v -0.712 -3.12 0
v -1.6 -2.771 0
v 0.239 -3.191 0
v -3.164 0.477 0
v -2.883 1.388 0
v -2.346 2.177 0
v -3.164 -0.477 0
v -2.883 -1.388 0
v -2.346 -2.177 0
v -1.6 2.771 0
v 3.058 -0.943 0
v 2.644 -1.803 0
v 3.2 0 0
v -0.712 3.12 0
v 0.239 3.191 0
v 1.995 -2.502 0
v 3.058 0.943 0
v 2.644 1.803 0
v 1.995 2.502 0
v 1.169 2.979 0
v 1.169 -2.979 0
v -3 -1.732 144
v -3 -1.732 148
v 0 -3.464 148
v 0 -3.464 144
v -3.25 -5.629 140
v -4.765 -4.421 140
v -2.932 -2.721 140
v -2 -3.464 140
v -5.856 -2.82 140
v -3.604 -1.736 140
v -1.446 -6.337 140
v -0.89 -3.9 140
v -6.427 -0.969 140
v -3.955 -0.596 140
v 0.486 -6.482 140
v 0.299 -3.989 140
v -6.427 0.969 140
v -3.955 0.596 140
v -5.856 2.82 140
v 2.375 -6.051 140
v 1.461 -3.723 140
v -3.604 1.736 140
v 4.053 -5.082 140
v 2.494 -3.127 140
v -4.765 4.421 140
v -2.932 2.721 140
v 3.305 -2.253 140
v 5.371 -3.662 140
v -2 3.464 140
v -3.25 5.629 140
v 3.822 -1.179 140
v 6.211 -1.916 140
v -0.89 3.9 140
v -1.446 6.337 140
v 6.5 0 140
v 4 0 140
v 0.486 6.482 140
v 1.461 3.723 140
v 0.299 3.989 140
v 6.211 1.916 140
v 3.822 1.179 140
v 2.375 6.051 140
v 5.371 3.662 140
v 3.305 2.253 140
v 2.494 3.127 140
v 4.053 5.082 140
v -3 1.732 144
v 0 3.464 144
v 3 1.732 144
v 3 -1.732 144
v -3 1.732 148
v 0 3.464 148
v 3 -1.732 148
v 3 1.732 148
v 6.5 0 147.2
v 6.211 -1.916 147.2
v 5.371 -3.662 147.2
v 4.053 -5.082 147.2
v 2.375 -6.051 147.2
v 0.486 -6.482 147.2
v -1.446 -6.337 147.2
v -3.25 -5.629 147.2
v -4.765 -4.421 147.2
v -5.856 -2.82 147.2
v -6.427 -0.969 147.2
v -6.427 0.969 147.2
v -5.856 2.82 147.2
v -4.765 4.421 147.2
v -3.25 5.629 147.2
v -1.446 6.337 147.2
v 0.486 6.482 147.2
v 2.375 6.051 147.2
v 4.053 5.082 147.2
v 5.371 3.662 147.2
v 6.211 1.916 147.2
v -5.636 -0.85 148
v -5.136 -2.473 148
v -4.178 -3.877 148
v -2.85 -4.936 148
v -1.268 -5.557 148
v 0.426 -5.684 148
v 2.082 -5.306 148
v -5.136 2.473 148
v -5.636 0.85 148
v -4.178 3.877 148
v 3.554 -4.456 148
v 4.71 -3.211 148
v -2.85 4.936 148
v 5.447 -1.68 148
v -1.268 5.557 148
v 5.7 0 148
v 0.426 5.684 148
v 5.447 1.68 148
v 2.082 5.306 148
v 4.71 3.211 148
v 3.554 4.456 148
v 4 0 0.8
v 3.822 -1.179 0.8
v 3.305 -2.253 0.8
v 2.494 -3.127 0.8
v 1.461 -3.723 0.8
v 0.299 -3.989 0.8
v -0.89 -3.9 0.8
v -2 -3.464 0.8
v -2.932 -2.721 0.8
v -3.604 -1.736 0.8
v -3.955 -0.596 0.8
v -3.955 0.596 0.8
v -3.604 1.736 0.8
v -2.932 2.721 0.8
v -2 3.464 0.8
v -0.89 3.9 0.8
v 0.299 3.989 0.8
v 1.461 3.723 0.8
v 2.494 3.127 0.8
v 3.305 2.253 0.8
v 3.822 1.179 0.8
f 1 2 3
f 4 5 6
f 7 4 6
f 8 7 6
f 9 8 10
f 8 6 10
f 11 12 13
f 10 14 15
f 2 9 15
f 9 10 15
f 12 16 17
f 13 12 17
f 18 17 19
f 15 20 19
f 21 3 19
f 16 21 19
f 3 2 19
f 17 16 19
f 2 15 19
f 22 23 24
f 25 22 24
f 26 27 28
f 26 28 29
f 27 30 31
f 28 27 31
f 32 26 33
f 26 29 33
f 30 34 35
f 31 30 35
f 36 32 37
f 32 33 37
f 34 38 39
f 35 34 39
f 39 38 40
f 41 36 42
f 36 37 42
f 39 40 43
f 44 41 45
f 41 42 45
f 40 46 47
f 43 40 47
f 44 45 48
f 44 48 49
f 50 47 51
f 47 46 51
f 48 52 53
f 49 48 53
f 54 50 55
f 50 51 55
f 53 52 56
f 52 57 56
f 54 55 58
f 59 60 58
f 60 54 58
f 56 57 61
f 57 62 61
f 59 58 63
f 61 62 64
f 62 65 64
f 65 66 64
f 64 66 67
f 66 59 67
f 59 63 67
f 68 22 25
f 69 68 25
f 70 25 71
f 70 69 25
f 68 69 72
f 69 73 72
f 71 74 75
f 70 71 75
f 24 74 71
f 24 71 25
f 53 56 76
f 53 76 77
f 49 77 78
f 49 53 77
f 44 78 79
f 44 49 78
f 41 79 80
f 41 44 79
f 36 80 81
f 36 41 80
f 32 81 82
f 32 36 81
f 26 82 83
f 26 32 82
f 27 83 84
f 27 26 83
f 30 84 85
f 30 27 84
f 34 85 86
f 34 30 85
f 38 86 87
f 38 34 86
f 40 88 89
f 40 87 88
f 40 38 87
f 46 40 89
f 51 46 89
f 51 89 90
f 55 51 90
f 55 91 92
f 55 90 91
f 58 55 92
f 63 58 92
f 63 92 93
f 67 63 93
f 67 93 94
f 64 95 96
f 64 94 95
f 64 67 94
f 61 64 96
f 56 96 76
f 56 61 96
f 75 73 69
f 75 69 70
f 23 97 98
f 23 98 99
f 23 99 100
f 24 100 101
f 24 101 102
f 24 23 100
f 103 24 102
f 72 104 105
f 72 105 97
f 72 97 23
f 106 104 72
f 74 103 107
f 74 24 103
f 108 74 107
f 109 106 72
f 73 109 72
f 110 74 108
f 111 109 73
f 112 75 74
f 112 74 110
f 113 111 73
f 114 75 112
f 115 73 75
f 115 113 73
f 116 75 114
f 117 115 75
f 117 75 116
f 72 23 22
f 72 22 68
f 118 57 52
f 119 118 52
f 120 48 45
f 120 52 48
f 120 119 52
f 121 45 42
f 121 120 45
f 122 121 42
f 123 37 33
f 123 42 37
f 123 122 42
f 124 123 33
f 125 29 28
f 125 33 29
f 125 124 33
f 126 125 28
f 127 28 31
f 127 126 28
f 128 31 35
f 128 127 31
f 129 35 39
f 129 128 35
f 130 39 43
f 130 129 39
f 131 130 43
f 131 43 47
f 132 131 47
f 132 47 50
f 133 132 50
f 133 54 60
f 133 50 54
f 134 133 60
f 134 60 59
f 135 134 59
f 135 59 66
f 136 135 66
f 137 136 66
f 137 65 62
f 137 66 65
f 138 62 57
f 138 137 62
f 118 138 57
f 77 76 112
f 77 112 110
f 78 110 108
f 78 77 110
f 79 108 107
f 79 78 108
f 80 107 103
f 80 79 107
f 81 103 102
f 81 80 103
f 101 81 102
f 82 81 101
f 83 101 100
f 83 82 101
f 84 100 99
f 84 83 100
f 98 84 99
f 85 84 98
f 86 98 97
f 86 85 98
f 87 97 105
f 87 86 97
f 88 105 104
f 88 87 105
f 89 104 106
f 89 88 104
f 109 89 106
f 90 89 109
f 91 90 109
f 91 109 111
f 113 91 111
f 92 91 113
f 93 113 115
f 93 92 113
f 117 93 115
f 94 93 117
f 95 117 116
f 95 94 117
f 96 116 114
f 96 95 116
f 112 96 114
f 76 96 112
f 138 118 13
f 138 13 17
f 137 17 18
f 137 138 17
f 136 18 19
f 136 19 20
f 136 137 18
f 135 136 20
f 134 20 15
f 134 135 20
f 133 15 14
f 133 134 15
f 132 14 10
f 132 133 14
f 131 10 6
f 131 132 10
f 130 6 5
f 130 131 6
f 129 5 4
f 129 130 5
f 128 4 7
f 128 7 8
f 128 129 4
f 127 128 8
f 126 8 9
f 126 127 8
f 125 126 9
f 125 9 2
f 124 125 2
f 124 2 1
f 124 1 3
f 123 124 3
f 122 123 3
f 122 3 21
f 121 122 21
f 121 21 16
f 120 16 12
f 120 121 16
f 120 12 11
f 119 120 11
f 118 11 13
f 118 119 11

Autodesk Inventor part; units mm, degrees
ref_plane "YZ Plane" through (0, 0, 0) normal (1, 0, 0) x (0, 1, 0)
ref_plane "XZ Plane" through (0, 0, 0) normal (0, 1, 0) x (-1, 0, 0)
ref_plane "XY Plane" through (0, 0, 0) normal (0, 0, 1) x (1, 0, 0)
sketch "Sketch1" plane through (0, 0, 0) normal (0, 0, 1) x (1, 0, 0)
  circle A0 centre (0, 0) radius 4
  dimension "Diameter" = 8
extrude "Extrusion1" add sketch "Sketch1" along normal blind 140
sketch "Sketch2" plane through (0, 0, 140) normal (0, 0, 1) x (1, 0, 0)
  circle A0 centre (0, 0) radius 4 projected
  circle A1 centre (0, 0) radius 6.5
  dimension "Head_Diameter" = 13
extrude "Extrusion2" add sketch "Sketch2" along normal blind 8 contours A0 | A1
sketch "Sketch3" plane through (0, 0, 148) normal (0, 0, 1) x (1, 0, 0)
  circle A0 centre (0, 0) radius 6.5 projected
  circle A1 centre (0, 0) radius 3.4641 construction
  line L0 (0, 3.4641) -> (3, 1.7321)
  line L1 (3, -1.7321) -> (3, 1.7321)
  line L2 (0, 3.4641) -> (-3, 1.7321)
  line L3 (-3, -1.7321) -> (-3, 1.7321)
  line L4 (-3, -1.7321) -> (0, -3.4641)
  line L5 (3, -1.7321) -> (0, -3.4641)
  dimension "Hex_Width" = 6
extrude "Extrusion3" cut sketch "Sketch3" against normal blind 4 contours L0 L1 L5 L4 L3 L2
thread "Thread1" size "M8x1.25" class "4g6g" standard "ANSI Metric M Profile" length 28
chamfer "Chamfer1" distance 0.8 angle 45 2 edges at (-6.5, 0, 148) (-4, 0, 0)
equation "\"d9\" = ThreadLength"
equation "\"d12\" = Chamfer"
equation "\"ThreadLength\" = 28"
equation "\"Chamfer\" = 0.8"
properties part number "SCREW, SOCKET HD, P, 12.9, M8X1.25X140MM" material "Steel, Mild"
